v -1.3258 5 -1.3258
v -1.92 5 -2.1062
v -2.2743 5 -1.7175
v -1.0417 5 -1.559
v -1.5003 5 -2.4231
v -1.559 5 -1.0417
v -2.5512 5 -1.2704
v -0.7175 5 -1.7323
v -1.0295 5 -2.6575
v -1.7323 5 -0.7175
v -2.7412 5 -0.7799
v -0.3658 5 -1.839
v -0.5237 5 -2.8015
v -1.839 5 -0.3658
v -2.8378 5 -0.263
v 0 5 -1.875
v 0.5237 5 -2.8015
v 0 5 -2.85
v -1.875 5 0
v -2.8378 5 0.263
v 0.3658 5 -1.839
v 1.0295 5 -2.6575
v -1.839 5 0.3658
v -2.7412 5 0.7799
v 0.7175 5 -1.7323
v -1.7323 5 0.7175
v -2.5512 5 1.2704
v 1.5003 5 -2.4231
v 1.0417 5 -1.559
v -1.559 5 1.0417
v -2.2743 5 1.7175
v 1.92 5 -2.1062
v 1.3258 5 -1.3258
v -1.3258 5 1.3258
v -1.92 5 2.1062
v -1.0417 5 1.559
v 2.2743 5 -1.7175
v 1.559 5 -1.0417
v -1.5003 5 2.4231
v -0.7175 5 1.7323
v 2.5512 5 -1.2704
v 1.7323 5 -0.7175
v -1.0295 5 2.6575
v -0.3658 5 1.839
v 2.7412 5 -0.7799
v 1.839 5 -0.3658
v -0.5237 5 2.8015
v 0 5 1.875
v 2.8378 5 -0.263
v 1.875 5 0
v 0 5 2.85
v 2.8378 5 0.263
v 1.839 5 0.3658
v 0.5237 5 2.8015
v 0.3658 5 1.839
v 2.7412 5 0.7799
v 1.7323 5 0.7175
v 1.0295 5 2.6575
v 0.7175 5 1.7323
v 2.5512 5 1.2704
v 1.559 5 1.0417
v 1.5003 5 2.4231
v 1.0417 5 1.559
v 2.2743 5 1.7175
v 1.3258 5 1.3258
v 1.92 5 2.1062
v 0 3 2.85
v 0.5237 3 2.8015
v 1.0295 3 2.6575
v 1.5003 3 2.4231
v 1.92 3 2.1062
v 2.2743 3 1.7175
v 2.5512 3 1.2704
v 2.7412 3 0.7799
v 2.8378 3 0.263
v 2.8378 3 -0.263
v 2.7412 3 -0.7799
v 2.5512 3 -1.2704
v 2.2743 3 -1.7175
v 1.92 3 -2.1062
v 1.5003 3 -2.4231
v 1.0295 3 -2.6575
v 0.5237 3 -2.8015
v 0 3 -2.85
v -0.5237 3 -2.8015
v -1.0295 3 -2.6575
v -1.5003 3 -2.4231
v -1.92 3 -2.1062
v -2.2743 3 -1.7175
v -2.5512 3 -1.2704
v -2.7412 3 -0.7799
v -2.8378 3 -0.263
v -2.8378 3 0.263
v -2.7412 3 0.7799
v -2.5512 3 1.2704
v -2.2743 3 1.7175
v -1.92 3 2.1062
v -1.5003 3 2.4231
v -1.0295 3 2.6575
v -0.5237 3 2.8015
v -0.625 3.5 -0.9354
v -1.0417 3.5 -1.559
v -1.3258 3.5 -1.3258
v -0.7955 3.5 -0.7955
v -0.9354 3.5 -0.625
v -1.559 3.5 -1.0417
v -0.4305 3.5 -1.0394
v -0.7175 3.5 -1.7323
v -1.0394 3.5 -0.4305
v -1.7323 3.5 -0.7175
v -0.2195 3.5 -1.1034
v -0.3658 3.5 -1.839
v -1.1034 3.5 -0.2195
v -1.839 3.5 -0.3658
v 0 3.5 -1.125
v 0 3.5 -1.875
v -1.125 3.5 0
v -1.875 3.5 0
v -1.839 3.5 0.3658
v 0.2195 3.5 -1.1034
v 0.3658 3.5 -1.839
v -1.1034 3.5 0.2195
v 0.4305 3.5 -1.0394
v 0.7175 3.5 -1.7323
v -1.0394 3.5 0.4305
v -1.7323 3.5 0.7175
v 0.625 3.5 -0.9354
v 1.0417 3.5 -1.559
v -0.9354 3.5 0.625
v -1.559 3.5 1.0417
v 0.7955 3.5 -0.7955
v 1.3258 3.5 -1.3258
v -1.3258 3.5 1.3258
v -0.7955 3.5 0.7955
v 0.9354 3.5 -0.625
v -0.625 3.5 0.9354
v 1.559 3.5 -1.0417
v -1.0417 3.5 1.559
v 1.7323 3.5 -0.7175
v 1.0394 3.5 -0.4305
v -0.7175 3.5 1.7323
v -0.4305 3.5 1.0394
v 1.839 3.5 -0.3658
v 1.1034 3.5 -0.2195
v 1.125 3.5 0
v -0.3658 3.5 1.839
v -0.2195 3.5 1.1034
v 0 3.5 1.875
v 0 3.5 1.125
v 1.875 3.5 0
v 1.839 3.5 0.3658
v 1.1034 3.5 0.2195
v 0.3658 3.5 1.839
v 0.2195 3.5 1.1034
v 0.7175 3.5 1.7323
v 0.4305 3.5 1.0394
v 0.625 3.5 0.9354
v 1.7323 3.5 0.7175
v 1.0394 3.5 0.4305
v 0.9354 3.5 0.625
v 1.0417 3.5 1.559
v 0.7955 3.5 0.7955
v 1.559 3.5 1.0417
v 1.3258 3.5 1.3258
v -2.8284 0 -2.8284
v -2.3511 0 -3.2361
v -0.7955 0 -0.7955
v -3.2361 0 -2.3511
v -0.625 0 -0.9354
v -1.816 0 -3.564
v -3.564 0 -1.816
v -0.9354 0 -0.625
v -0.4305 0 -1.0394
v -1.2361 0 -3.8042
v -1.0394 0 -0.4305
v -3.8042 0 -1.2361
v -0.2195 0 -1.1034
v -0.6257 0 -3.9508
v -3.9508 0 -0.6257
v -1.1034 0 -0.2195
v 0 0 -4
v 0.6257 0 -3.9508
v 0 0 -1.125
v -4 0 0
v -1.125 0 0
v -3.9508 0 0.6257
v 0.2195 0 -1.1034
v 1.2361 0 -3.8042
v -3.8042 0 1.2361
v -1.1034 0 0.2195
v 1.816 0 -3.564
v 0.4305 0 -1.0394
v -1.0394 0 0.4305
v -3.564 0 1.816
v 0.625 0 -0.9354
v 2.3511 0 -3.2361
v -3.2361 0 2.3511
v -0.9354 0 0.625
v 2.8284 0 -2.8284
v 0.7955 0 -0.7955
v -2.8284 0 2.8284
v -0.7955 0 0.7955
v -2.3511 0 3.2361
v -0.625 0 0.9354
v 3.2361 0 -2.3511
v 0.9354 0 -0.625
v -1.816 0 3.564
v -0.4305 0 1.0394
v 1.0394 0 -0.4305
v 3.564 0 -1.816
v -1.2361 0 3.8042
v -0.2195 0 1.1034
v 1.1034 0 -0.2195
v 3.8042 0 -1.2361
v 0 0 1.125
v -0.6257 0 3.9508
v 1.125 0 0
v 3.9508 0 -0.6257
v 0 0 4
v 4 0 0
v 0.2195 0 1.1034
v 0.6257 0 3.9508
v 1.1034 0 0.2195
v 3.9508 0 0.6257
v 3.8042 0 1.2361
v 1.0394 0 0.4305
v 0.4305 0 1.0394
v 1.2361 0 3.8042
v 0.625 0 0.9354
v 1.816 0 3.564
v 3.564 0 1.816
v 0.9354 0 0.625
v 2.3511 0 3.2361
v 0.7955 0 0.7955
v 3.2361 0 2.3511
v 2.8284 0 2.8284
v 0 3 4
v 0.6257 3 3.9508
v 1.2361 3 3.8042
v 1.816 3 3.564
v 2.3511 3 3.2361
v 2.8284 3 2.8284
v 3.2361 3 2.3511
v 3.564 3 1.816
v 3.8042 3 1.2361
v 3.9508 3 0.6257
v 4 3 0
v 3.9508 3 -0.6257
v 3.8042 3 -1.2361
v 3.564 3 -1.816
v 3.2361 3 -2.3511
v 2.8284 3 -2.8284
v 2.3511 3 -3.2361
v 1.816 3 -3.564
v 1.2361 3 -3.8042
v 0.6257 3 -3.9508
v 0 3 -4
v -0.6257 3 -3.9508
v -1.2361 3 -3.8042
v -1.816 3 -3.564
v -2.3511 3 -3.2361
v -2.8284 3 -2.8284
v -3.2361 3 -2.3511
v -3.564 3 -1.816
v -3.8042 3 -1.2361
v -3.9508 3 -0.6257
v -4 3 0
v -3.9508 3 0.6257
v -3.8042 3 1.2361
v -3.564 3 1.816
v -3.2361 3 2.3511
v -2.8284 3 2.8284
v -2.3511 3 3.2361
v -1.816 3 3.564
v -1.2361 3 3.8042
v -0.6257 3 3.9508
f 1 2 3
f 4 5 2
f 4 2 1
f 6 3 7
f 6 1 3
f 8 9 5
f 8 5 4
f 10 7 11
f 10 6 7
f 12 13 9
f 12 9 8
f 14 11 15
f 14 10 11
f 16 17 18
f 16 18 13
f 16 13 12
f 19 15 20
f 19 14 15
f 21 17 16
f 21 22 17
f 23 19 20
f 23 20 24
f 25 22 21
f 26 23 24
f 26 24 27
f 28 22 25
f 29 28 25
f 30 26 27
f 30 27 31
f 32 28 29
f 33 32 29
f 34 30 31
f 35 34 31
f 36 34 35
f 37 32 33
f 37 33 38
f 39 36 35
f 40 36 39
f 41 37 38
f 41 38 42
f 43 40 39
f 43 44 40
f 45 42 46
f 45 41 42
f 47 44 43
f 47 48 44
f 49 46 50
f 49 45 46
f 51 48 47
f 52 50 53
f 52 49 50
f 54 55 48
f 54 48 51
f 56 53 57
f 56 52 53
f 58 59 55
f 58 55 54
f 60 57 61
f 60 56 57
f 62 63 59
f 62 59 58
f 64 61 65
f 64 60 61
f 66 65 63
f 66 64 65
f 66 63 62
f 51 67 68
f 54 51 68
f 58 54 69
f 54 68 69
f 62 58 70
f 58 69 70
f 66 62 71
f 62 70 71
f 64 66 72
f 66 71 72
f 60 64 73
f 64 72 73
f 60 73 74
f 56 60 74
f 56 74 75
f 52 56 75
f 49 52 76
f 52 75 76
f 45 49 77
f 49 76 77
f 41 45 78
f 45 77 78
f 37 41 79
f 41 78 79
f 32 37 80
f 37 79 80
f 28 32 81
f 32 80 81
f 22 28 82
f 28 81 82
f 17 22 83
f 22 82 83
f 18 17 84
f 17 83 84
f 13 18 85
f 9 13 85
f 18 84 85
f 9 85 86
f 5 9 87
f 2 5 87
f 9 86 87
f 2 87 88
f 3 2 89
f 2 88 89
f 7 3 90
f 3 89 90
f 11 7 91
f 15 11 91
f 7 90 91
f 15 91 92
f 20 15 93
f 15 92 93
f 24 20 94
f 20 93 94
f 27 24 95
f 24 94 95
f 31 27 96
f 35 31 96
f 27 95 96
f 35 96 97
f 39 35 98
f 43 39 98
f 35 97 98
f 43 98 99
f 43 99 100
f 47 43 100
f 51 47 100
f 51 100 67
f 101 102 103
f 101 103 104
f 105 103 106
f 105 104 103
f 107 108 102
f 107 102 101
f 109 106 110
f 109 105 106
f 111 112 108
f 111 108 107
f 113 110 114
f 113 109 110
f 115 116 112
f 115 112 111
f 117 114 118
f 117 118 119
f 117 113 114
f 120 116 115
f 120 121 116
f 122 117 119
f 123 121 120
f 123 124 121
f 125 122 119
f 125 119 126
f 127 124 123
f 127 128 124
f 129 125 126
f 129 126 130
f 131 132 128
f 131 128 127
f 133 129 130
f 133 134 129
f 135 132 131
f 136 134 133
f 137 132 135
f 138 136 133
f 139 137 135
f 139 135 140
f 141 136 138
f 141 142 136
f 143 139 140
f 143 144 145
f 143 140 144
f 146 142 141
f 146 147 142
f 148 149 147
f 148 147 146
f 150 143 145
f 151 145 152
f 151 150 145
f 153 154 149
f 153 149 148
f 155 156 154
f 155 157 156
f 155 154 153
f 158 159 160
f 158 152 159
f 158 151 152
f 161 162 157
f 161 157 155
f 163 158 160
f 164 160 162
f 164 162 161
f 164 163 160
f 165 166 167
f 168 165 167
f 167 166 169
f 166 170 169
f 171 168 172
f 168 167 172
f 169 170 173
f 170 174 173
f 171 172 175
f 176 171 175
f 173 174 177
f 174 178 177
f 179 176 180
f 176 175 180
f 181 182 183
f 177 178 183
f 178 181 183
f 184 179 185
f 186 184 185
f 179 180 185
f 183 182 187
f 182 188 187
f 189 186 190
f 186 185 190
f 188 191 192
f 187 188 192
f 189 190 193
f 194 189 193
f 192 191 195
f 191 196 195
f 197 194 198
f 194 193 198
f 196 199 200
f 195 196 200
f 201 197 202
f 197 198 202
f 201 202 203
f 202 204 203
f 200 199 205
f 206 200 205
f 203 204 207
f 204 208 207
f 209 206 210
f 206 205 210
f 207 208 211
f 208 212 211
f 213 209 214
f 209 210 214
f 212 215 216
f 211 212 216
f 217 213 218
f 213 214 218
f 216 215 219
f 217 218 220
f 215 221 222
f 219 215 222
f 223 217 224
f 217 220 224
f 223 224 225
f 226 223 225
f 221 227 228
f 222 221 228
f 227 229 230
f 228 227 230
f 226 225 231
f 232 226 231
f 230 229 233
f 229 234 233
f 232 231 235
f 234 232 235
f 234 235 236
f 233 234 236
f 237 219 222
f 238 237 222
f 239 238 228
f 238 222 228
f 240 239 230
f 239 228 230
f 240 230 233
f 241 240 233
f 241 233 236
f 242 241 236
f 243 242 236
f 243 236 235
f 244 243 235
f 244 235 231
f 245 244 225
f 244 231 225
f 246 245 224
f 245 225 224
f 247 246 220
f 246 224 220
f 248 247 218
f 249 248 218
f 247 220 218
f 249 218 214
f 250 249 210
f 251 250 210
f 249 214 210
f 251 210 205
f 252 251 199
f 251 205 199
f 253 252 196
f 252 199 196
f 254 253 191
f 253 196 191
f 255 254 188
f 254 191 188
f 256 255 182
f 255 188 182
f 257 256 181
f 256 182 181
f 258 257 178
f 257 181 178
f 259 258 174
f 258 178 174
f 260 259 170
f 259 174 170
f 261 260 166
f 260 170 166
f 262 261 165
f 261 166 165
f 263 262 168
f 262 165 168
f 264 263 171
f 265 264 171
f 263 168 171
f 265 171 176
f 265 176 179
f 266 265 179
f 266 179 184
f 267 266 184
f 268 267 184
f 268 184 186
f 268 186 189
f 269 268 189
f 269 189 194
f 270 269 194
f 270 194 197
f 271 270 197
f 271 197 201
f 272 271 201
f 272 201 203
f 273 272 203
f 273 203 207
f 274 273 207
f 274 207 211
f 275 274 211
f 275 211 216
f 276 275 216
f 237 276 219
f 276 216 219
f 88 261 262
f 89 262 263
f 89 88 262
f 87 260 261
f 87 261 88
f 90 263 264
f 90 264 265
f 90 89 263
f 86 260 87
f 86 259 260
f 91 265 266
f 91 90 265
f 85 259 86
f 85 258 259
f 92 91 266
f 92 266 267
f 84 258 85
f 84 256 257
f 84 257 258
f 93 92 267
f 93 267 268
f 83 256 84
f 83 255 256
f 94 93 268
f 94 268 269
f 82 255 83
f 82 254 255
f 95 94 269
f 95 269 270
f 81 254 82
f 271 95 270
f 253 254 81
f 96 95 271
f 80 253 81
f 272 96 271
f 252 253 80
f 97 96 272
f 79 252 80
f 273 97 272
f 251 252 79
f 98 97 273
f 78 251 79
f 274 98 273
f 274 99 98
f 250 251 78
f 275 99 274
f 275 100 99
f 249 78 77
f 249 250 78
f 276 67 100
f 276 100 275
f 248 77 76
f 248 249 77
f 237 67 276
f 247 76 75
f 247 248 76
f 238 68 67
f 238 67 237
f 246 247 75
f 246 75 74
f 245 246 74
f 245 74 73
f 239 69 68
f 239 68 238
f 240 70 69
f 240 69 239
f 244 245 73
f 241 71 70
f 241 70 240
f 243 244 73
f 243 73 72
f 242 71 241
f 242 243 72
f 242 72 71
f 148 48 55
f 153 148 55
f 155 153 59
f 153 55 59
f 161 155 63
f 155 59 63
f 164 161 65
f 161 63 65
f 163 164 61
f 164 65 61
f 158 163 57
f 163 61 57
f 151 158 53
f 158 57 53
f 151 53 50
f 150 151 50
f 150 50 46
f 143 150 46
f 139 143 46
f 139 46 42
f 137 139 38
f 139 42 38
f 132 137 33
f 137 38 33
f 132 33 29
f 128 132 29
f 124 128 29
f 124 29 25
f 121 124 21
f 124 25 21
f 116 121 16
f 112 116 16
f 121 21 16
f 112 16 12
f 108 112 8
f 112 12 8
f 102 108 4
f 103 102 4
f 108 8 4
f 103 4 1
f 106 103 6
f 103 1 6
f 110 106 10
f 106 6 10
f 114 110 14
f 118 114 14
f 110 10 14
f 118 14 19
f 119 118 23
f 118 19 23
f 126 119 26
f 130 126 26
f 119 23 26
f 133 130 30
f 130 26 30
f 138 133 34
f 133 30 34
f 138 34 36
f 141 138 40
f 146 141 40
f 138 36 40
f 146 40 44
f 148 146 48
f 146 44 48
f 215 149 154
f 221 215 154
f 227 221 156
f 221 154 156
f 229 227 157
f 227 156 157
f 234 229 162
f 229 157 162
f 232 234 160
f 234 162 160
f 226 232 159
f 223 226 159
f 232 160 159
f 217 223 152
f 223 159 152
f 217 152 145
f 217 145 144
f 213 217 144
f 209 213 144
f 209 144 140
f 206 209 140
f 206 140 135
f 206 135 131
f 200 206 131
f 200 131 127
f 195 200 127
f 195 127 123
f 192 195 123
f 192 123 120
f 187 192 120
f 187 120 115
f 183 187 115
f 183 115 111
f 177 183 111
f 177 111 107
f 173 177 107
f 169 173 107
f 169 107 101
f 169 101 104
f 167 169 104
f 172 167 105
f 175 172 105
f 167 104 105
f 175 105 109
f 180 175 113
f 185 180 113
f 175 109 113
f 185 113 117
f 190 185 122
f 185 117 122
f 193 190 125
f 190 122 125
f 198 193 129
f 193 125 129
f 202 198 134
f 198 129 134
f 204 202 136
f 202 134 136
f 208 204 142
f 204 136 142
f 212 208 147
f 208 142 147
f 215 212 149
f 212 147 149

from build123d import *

# Parameters (mm, degrees)
CROQUIS1_R              = 4
SALIENTE_EXTRUIR1_DEPTH = 3
CROQUIS2_R              = 2.85
SALIENTE_EXTRUIR2_DEPTH = 2
CROQUIS3_R              = 1.125
CORTAR_EXTRUIR1_DEPTH   = 8.549834435
CROQUIS4_R              = 1.875
CORTAR_EXTRUIR2_DEPTH   = 1.5


with BuildPart() as part:
    # Croquis1 → Saliente-Extruir1 (new body)
    with BuildSketch(Plane(origin=(0, 0, 0), x_dir=(1, 0, 0), z_dir=(0, 1, 0))):
        with Locations(Location((0, 0, 0), (0, 0, 270))):
            Circle(CROQUIS1_R)
    extrude(amount=SALIENTE_EXTRUIR1_DEPTH)

    # Croquis2 → Saliente-Extruir2 (add)
    with BuildSketch(Plane(origin=(0, 3, 0), x_dir=(1, 0, 0), z_dir=(0, 1, 0))):
        with Locations(Location((0, 0, 0), (0, 0, 270))):
            Circle(CROQUIS2_R)
    extrude(amount=SALIENTE_EXTRUIR2_DEPTH)

    # Croquis3 → Cortar-Extruir1 (cut, through all)
    with BuildSketch(Plane(origin=(0, 5, 0), x_dir=(1, 0, 0), z_dir=(0, 1, 0))):
        with Locations(Location((0, 0, 0), (0, 0, 270))):
            Circle(CROQUIS3_R)
    extrude(amount=-CORTAR_EXTRUIR1_DEPTH, mode=Mode.SUBTRACT)

    # Croquis4 → Cortar-Extruir2 (cut)
    with BuildSketch(Plane(origin=(0, 5, 0), x_dir=(1, 0, 0), z_dir=(0, 1, 0))):
        with Locations(Location((0, 0, 0), (0, 0, 270))):
            Circle(CROQUIS4_R)
    extrude(amount=-CORTAR_EXTRUIR2_DEPTH, mode=Mode.SUBTRACT)


solid = part.part
